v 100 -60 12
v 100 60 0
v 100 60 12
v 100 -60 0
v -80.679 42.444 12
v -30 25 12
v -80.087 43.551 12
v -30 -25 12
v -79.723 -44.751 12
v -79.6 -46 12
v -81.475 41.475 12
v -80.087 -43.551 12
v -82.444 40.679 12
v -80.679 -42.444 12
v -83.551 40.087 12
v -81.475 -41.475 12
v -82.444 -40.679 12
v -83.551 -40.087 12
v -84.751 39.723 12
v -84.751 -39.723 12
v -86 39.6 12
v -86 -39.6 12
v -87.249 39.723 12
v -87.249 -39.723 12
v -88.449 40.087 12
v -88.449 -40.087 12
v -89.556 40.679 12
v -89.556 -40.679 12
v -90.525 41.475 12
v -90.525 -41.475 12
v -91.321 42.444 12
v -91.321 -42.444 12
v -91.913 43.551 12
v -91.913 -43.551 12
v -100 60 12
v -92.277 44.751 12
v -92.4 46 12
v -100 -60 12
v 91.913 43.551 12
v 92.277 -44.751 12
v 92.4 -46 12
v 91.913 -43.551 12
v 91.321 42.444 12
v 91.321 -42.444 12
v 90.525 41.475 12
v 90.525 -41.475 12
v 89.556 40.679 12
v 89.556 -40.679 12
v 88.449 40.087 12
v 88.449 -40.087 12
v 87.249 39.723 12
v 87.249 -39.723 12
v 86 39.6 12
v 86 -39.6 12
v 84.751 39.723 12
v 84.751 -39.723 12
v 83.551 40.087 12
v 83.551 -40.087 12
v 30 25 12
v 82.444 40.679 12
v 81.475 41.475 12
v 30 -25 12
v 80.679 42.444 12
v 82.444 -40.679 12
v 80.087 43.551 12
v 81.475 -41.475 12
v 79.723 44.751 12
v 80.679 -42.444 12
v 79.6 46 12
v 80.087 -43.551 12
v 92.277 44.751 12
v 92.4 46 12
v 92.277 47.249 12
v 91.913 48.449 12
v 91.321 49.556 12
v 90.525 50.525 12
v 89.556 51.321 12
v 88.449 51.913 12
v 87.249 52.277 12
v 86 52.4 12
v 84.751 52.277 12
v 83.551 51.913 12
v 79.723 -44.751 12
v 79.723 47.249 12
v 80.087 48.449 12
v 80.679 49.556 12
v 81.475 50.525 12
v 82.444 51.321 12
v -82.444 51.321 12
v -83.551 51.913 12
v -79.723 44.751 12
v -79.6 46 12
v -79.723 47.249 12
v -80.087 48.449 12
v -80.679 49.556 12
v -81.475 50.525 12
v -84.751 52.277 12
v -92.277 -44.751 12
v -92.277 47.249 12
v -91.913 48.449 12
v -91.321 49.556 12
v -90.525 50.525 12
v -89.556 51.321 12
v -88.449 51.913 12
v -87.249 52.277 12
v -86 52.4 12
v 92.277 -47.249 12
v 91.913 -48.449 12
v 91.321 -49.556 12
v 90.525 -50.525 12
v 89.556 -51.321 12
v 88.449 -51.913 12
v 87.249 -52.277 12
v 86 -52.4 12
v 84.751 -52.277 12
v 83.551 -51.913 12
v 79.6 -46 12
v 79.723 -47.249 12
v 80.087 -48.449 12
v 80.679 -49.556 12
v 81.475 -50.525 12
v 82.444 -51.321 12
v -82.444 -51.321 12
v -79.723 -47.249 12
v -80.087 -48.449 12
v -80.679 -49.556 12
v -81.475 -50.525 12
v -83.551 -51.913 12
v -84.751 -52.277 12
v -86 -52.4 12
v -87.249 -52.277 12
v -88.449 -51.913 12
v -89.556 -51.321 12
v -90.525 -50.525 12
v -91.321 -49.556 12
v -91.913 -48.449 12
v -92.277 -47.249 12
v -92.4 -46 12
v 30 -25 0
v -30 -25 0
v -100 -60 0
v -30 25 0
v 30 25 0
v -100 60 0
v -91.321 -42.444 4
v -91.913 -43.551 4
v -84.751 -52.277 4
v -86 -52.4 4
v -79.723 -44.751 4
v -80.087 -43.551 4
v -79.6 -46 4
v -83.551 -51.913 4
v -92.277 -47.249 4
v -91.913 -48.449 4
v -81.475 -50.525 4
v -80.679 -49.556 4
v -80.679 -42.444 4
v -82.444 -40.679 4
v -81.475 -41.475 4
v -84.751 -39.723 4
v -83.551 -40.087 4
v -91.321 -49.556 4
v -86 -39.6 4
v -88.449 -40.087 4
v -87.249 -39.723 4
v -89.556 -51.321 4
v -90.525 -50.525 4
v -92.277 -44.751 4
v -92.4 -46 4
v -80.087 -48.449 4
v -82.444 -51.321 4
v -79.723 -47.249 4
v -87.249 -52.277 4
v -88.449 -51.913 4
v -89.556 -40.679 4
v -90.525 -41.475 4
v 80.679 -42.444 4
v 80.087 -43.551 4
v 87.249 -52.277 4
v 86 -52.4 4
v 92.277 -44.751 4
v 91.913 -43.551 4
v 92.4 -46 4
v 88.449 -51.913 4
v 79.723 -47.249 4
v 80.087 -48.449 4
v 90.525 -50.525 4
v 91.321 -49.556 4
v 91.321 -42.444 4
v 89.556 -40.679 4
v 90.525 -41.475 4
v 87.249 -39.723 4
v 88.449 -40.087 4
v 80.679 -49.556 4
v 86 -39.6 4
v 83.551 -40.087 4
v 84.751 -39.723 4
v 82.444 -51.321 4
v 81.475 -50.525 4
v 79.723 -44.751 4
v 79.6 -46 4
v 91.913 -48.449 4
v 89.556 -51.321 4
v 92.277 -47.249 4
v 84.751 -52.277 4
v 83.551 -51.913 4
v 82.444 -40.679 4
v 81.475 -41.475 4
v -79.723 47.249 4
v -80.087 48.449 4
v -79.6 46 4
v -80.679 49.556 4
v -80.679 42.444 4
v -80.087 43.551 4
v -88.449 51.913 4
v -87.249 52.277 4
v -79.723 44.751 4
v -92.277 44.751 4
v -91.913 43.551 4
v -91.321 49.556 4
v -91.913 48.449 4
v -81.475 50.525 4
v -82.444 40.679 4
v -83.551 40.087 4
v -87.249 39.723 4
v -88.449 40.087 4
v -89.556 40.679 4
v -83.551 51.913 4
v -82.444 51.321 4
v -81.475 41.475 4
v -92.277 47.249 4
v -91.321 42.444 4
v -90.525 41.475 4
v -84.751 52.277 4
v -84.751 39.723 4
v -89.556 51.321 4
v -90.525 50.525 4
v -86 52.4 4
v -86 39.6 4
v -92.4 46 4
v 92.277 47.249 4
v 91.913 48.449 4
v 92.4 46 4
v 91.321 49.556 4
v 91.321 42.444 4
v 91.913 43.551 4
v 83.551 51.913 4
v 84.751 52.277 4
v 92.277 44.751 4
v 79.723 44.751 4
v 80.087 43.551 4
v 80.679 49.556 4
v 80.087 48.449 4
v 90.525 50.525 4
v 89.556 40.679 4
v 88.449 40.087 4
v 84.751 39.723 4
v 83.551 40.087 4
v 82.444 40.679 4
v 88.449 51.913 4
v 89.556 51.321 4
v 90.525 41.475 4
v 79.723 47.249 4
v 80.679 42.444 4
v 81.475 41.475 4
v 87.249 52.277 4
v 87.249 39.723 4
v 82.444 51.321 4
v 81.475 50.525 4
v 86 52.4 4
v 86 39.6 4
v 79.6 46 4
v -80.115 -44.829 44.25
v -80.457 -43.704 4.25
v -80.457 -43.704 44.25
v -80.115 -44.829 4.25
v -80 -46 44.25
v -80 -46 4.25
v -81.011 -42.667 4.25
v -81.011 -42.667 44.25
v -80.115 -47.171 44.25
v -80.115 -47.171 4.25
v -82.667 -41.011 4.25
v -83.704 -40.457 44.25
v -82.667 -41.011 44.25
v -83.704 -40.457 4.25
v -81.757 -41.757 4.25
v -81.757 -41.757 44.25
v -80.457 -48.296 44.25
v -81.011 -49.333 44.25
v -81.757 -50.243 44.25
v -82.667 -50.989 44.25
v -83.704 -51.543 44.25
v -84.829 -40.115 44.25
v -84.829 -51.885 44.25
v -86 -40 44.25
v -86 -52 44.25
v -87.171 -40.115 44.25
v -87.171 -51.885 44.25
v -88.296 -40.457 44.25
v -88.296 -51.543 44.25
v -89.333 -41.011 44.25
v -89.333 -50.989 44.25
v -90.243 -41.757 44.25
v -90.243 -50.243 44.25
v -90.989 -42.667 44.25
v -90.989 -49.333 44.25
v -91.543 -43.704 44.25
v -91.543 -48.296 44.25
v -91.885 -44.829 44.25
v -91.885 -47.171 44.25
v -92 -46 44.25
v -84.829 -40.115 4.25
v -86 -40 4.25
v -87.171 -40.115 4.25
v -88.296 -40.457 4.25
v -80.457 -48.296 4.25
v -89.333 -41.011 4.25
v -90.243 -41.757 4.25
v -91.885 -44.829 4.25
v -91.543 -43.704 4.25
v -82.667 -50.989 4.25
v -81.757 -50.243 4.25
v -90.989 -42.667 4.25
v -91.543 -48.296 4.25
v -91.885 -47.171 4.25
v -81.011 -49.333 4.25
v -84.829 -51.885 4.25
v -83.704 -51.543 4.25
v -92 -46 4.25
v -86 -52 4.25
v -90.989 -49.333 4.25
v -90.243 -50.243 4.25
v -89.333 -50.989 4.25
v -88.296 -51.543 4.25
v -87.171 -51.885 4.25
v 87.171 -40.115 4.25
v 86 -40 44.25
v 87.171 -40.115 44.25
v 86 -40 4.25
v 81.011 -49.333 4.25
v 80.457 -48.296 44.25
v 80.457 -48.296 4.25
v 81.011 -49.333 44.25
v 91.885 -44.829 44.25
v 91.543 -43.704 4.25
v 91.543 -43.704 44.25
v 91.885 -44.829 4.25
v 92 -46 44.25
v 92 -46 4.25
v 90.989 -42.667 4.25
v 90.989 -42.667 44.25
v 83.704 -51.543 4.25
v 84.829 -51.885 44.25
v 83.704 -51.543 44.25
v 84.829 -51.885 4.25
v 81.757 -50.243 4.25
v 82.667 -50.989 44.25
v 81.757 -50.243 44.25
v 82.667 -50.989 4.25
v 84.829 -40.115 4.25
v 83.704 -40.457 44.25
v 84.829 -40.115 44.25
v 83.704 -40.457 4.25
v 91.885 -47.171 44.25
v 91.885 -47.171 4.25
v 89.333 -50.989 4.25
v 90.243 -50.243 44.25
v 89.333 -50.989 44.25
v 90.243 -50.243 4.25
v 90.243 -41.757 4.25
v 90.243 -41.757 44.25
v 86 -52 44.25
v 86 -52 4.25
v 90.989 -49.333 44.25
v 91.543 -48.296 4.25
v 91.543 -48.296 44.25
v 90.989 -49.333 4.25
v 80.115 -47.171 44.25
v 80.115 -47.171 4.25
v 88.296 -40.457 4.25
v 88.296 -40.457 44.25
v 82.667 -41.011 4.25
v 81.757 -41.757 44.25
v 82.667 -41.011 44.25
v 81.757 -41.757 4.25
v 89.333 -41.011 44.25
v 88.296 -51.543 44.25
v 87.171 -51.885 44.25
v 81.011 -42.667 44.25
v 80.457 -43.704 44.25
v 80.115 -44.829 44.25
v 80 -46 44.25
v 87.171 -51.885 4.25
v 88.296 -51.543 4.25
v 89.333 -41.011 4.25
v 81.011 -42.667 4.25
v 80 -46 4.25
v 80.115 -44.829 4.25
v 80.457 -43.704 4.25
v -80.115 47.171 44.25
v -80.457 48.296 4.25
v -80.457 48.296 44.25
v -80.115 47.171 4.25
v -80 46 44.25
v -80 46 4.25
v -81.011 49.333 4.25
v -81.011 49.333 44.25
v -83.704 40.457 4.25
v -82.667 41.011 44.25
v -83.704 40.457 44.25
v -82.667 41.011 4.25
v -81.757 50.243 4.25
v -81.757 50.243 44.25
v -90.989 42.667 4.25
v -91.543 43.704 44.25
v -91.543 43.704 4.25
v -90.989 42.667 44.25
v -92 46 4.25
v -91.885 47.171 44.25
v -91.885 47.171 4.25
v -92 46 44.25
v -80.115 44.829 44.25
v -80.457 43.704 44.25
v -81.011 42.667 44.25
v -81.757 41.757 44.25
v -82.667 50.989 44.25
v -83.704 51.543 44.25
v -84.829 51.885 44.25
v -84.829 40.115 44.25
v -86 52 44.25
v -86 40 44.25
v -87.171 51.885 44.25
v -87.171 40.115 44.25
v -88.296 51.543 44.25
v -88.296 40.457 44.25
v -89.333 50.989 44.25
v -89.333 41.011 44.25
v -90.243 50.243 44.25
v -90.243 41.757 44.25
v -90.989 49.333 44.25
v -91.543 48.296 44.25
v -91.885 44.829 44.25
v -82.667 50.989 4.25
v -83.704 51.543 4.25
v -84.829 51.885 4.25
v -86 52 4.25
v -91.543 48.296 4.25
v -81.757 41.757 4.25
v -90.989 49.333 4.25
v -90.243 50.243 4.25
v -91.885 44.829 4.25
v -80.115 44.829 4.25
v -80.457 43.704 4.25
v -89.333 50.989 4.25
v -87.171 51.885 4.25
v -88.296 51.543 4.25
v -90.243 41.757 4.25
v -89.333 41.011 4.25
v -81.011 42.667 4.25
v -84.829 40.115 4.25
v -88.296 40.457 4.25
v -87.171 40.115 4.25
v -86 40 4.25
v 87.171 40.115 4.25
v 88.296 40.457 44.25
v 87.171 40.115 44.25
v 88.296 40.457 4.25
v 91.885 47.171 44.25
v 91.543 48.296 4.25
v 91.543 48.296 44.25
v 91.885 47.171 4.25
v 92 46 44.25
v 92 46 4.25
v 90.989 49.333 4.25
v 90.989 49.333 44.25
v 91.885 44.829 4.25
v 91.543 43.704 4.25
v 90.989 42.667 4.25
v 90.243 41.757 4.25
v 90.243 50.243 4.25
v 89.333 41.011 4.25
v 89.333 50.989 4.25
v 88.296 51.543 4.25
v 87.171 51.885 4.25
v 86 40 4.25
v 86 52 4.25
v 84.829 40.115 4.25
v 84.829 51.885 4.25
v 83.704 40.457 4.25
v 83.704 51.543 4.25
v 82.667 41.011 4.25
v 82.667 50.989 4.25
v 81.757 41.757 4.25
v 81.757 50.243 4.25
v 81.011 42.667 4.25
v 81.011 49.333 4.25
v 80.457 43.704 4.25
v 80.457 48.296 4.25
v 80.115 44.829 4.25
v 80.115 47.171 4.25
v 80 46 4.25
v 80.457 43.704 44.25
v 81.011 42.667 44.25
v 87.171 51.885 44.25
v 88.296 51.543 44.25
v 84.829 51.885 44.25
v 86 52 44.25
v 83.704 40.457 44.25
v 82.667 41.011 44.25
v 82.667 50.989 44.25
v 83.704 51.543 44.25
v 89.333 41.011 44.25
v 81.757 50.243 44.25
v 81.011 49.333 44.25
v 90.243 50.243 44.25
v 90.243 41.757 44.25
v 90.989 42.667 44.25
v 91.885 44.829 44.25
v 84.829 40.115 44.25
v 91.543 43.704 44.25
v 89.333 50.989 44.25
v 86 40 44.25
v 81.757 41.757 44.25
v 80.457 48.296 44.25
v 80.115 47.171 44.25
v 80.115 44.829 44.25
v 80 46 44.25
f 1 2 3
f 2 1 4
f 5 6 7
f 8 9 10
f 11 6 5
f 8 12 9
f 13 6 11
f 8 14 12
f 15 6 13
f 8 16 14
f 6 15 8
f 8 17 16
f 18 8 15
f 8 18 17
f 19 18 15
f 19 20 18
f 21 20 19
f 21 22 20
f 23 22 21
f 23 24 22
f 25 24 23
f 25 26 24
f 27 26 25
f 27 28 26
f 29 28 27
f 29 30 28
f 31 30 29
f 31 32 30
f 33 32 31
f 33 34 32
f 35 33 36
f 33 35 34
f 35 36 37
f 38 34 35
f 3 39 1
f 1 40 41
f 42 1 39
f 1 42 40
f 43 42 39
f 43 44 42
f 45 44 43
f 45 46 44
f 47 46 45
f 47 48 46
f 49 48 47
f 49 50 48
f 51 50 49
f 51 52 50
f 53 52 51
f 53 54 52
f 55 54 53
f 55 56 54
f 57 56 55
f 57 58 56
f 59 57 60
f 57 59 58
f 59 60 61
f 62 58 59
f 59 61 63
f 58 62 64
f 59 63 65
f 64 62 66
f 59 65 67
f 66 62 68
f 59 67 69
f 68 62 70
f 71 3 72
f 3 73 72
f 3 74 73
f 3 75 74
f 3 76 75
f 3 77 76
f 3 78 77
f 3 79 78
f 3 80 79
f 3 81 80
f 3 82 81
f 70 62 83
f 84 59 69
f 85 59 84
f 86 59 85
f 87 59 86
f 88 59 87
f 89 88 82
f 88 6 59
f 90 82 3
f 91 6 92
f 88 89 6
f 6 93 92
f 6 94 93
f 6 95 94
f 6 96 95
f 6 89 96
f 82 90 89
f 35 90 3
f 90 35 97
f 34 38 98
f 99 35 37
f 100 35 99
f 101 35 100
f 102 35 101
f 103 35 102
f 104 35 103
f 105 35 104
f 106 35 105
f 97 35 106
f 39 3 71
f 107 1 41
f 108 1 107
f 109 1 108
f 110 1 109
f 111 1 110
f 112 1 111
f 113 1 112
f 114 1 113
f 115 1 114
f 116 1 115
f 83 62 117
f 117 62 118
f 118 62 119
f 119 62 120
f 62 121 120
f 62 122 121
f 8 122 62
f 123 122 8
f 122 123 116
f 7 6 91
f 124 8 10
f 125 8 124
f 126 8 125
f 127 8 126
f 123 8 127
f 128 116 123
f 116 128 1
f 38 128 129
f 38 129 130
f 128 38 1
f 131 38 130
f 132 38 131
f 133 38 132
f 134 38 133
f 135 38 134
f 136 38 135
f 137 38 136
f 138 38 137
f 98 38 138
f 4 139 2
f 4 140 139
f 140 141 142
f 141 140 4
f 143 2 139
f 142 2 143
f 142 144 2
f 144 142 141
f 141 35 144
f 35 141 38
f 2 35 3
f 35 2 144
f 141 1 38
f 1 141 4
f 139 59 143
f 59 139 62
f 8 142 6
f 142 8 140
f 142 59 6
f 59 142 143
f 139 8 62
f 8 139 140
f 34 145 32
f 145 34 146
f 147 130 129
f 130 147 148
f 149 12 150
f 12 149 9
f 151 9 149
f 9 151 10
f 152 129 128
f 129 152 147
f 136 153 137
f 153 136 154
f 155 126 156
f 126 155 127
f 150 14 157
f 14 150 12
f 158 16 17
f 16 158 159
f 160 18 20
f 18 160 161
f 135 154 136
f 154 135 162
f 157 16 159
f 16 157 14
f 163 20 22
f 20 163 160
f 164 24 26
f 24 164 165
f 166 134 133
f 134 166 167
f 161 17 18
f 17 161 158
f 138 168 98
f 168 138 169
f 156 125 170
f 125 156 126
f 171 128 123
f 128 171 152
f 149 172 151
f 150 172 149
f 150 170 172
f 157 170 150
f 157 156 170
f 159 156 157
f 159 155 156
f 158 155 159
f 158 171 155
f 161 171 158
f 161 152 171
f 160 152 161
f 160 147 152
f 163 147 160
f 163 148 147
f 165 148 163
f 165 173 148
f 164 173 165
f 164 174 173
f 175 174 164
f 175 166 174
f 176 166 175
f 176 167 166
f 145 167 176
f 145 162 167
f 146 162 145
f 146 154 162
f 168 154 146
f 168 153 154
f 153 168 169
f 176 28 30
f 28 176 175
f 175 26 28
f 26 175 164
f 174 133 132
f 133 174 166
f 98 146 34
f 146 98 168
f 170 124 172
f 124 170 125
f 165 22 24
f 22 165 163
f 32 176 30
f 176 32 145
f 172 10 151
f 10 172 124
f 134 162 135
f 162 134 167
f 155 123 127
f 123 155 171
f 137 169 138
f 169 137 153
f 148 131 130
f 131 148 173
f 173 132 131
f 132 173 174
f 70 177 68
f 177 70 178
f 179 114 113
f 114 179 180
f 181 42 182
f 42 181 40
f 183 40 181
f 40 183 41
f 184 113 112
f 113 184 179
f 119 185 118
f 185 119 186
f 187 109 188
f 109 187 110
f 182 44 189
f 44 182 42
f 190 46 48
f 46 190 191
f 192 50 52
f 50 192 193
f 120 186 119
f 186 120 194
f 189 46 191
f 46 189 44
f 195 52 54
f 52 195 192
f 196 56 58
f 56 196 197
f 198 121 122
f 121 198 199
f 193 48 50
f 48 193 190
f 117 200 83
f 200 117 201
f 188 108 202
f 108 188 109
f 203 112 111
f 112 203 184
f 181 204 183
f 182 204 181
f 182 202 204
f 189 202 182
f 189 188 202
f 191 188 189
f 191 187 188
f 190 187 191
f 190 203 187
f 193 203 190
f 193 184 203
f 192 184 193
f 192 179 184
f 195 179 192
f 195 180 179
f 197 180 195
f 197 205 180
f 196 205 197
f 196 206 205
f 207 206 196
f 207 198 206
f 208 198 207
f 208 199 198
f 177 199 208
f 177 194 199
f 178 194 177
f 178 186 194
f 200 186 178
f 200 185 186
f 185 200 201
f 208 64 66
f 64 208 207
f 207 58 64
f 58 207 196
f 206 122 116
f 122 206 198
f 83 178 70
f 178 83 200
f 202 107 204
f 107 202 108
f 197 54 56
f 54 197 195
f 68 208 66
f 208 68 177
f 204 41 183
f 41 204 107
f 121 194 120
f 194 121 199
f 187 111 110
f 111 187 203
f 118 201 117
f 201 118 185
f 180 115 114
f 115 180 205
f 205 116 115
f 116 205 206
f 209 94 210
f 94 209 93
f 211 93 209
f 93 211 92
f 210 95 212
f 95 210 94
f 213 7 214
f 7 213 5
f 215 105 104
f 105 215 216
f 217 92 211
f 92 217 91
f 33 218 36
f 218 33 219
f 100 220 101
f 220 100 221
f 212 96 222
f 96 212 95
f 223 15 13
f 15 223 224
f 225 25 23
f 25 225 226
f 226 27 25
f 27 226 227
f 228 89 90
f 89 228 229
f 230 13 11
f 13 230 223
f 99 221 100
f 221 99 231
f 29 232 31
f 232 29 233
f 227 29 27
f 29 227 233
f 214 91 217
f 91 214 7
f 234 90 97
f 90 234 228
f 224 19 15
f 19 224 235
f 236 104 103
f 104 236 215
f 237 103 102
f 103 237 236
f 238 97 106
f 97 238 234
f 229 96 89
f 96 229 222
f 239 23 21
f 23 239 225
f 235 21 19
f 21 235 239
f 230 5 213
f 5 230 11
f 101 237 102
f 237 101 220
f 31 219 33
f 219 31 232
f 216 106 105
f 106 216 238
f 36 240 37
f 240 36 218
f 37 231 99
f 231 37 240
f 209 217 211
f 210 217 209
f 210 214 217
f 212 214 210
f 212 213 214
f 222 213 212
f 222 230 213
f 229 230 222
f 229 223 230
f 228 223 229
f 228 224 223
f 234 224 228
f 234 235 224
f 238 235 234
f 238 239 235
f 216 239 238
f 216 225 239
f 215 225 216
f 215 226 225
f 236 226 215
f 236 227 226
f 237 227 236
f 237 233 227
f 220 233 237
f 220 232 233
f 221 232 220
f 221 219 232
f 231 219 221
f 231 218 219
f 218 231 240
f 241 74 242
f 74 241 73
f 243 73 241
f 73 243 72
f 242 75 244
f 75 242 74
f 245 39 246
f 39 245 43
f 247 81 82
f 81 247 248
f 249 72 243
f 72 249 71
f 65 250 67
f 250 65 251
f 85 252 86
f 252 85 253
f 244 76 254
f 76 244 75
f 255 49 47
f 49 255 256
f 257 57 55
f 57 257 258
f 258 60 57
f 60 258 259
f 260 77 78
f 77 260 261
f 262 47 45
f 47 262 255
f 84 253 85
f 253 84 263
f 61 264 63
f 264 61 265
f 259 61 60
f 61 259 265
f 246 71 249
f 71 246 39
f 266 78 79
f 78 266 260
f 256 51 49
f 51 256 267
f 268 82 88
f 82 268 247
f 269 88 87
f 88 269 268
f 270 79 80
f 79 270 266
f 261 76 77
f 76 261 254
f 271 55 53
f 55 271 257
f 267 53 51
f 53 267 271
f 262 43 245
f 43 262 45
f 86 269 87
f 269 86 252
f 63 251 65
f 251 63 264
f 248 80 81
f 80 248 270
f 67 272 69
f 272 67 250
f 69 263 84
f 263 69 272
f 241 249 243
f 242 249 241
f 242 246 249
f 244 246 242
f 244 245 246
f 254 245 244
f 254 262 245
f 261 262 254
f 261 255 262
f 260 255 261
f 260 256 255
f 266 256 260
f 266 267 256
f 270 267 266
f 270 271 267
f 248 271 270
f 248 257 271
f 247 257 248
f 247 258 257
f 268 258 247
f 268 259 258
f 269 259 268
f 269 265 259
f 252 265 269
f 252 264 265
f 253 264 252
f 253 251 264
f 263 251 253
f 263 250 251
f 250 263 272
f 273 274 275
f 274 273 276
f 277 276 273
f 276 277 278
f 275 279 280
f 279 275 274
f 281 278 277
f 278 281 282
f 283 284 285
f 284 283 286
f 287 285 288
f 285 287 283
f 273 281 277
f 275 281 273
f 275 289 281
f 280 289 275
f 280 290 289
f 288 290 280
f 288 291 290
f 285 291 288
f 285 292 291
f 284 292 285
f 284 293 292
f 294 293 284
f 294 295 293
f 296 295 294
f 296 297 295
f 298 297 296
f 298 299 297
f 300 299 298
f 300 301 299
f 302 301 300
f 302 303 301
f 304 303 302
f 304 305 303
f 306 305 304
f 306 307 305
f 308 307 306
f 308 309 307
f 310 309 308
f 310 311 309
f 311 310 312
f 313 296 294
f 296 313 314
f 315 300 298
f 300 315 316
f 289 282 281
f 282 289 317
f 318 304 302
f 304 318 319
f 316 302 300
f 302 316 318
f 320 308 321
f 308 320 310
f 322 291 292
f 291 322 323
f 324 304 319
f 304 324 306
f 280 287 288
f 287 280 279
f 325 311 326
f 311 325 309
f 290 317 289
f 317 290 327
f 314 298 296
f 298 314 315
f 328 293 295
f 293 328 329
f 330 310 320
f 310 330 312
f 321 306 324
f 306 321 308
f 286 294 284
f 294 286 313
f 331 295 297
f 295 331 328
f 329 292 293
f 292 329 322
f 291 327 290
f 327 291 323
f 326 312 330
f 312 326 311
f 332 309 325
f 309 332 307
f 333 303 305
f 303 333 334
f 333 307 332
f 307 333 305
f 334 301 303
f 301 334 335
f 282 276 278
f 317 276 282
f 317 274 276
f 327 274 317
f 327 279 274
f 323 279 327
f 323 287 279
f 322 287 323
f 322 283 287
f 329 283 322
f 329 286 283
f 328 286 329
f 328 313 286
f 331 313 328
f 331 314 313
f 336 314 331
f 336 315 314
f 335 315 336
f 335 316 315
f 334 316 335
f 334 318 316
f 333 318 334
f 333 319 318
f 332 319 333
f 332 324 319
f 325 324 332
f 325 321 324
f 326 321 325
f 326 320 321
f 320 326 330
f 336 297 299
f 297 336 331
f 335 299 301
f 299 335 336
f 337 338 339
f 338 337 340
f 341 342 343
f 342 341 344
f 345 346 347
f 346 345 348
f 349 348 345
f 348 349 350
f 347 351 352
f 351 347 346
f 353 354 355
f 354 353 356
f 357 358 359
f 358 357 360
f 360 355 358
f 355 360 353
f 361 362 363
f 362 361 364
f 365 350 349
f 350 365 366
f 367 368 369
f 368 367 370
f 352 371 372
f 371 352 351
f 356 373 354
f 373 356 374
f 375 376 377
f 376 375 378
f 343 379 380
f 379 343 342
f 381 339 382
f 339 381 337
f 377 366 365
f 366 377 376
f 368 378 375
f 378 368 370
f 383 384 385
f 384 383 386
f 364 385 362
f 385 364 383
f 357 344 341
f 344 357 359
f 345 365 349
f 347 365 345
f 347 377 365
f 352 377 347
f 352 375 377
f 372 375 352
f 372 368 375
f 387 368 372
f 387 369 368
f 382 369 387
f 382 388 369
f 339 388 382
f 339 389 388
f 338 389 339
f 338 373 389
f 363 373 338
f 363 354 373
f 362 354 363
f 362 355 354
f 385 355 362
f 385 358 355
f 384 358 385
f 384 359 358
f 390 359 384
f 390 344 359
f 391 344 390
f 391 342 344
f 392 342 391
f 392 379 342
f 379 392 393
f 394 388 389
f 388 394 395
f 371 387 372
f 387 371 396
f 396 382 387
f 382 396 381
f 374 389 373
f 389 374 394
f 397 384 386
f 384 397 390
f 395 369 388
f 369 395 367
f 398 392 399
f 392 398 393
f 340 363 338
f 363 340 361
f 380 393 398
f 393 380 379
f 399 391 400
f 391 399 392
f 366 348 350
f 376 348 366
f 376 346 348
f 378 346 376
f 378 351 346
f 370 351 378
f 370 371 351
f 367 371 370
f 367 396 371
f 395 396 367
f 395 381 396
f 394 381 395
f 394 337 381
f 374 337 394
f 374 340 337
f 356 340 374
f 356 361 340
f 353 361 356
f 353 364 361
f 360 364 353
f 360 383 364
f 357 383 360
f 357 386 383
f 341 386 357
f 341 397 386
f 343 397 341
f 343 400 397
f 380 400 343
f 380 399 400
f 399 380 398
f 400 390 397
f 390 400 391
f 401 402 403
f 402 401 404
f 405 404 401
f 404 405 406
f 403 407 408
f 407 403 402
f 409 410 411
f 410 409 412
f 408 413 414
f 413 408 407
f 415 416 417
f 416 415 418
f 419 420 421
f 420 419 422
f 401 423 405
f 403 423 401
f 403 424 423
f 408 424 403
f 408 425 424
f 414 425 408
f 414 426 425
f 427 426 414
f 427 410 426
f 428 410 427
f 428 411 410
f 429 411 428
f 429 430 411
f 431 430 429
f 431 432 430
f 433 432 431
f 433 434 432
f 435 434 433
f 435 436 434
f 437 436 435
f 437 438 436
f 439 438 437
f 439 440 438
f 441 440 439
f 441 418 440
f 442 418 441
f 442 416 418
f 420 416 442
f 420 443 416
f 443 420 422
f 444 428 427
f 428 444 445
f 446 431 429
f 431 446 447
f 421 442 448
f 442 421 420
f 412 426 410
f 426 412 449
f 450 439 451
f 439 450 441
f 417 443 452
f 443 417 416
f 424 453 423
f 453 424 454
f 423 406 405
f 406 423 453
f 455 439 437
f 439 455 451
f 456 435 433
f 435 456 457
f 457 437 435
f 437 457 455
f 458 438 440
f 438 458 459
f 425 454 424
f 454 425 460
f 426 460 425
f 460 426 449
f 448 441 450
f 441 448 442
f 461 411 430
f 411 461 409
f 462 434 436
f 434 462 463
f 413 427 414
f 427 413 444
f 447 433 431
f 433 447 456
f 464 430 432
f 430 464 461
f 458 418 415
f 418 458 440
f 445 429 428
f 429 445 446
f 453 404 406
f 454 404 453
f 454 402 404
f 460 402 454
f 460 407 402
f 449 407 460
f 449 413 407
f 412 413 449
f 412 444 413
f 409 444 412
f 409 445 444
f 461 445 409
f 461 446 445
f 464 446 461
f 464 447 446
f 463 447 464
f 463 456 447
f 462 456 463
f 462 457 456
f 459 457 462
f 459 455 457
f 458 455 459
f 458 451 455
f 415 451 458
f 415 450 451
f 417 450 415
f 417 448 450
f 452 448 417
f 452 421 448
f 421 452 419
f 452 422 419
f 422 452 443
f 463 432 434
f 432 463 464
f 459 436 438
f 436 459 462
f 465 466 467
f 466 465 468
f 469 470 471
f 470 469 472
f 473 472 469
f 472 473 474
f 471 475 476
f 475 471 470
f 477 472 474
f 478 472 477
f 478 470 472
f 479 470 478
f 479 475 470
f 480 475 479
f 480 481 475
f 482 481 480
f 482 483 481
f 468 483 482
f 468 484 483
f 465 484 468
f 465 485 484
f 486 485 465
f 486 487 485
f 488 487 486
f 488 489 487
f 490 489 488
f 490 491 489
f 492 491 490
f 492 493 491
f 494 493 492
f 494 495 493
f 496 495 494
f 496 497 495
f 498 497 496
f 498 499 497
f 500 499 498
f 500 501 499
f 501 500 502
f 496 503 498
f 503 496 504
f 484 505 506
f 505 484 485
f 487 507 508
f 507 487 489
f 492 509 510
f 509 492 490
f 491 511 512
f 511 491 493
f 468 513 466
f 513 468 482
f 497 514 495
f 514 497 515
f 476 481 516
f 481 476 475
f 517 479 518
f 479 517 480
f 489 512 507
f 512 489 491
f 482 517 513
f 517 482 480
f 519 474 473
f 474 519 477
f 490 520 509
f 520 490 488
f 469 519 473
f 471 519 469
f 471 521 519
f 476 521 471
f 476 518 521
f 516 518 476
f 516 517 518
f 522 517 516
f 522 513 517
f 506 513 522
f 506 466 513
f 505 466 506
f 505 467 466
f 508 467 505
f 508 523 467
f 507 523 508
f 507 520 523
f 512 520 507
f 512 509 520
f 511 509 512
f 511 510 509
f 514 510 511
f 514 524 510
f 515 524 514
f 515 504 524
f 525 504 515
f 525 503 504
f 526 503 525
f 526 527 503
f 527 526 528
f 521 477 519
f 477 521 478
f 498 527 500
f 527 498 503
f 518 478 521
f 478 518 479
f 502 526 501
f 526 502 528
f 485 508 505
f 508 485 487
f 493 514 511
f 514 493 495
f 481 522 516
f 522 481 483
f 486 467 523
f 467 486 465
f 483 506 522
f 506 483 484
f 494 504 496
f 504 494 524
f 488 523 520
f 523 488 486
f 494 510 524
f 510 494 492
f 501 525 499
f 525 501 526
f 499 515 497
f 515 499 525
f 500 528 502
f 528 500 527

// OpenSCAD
$fn = 32;

// ------------------------------------------------------------------------
// Frame with four posts: 200 x 120 mm frame, four d12 posts
// Every part is its own module, assembly() places them once.
// ------------------------------------------------------------------------

// --- part 1 ---
module base_frame() {
  difference() {
    translate([-100, -60, 0]) cube([200, 120, 12]);
    translate([-30, -25, -1]) cube([60, 50, 14]);
    translate([-86, -46, 4]) cylinder(h = 9, d = 12.8);
    translate([86, -46, 4]) cylinder(h = 9, d = 12.8);
    translate([-86, 46, 4]) cylinder(h = 9, d = 12.8);
    translate([86, 46, 4]) cylinder(h = 9, d = 12.8);
  }
}

// --- part 2 ---
module post1() {
  cylinder(h = 40, d = 12);
}

// --- part 3 ---
module post2() {
  cylinder(h = 40, d = 12);
}

// --- part 4 ---
module post3() {
  cylinder(h = 40, d = 12);
}

// --- part 5 ---
module post4() {
  cylinder(h = 40, d = 12);
}

// --- assembly ---
module assembly() {
  translate([0, 0, 0]) rotate([0, 0, 0]) base_frame();
  translate([-86, -46, 4.25]) rotate([0, 0, 0]) post1();
  translate([86, -46, 4.25]) rotate([0, 0, 0]) post2();
  translate([-86, 46, 4.25]) rotate([0, 0, 0]) post3();
  translate([86, 46, 4.25]) rotate([0, 0, 0]) post4();
}

assembly();
